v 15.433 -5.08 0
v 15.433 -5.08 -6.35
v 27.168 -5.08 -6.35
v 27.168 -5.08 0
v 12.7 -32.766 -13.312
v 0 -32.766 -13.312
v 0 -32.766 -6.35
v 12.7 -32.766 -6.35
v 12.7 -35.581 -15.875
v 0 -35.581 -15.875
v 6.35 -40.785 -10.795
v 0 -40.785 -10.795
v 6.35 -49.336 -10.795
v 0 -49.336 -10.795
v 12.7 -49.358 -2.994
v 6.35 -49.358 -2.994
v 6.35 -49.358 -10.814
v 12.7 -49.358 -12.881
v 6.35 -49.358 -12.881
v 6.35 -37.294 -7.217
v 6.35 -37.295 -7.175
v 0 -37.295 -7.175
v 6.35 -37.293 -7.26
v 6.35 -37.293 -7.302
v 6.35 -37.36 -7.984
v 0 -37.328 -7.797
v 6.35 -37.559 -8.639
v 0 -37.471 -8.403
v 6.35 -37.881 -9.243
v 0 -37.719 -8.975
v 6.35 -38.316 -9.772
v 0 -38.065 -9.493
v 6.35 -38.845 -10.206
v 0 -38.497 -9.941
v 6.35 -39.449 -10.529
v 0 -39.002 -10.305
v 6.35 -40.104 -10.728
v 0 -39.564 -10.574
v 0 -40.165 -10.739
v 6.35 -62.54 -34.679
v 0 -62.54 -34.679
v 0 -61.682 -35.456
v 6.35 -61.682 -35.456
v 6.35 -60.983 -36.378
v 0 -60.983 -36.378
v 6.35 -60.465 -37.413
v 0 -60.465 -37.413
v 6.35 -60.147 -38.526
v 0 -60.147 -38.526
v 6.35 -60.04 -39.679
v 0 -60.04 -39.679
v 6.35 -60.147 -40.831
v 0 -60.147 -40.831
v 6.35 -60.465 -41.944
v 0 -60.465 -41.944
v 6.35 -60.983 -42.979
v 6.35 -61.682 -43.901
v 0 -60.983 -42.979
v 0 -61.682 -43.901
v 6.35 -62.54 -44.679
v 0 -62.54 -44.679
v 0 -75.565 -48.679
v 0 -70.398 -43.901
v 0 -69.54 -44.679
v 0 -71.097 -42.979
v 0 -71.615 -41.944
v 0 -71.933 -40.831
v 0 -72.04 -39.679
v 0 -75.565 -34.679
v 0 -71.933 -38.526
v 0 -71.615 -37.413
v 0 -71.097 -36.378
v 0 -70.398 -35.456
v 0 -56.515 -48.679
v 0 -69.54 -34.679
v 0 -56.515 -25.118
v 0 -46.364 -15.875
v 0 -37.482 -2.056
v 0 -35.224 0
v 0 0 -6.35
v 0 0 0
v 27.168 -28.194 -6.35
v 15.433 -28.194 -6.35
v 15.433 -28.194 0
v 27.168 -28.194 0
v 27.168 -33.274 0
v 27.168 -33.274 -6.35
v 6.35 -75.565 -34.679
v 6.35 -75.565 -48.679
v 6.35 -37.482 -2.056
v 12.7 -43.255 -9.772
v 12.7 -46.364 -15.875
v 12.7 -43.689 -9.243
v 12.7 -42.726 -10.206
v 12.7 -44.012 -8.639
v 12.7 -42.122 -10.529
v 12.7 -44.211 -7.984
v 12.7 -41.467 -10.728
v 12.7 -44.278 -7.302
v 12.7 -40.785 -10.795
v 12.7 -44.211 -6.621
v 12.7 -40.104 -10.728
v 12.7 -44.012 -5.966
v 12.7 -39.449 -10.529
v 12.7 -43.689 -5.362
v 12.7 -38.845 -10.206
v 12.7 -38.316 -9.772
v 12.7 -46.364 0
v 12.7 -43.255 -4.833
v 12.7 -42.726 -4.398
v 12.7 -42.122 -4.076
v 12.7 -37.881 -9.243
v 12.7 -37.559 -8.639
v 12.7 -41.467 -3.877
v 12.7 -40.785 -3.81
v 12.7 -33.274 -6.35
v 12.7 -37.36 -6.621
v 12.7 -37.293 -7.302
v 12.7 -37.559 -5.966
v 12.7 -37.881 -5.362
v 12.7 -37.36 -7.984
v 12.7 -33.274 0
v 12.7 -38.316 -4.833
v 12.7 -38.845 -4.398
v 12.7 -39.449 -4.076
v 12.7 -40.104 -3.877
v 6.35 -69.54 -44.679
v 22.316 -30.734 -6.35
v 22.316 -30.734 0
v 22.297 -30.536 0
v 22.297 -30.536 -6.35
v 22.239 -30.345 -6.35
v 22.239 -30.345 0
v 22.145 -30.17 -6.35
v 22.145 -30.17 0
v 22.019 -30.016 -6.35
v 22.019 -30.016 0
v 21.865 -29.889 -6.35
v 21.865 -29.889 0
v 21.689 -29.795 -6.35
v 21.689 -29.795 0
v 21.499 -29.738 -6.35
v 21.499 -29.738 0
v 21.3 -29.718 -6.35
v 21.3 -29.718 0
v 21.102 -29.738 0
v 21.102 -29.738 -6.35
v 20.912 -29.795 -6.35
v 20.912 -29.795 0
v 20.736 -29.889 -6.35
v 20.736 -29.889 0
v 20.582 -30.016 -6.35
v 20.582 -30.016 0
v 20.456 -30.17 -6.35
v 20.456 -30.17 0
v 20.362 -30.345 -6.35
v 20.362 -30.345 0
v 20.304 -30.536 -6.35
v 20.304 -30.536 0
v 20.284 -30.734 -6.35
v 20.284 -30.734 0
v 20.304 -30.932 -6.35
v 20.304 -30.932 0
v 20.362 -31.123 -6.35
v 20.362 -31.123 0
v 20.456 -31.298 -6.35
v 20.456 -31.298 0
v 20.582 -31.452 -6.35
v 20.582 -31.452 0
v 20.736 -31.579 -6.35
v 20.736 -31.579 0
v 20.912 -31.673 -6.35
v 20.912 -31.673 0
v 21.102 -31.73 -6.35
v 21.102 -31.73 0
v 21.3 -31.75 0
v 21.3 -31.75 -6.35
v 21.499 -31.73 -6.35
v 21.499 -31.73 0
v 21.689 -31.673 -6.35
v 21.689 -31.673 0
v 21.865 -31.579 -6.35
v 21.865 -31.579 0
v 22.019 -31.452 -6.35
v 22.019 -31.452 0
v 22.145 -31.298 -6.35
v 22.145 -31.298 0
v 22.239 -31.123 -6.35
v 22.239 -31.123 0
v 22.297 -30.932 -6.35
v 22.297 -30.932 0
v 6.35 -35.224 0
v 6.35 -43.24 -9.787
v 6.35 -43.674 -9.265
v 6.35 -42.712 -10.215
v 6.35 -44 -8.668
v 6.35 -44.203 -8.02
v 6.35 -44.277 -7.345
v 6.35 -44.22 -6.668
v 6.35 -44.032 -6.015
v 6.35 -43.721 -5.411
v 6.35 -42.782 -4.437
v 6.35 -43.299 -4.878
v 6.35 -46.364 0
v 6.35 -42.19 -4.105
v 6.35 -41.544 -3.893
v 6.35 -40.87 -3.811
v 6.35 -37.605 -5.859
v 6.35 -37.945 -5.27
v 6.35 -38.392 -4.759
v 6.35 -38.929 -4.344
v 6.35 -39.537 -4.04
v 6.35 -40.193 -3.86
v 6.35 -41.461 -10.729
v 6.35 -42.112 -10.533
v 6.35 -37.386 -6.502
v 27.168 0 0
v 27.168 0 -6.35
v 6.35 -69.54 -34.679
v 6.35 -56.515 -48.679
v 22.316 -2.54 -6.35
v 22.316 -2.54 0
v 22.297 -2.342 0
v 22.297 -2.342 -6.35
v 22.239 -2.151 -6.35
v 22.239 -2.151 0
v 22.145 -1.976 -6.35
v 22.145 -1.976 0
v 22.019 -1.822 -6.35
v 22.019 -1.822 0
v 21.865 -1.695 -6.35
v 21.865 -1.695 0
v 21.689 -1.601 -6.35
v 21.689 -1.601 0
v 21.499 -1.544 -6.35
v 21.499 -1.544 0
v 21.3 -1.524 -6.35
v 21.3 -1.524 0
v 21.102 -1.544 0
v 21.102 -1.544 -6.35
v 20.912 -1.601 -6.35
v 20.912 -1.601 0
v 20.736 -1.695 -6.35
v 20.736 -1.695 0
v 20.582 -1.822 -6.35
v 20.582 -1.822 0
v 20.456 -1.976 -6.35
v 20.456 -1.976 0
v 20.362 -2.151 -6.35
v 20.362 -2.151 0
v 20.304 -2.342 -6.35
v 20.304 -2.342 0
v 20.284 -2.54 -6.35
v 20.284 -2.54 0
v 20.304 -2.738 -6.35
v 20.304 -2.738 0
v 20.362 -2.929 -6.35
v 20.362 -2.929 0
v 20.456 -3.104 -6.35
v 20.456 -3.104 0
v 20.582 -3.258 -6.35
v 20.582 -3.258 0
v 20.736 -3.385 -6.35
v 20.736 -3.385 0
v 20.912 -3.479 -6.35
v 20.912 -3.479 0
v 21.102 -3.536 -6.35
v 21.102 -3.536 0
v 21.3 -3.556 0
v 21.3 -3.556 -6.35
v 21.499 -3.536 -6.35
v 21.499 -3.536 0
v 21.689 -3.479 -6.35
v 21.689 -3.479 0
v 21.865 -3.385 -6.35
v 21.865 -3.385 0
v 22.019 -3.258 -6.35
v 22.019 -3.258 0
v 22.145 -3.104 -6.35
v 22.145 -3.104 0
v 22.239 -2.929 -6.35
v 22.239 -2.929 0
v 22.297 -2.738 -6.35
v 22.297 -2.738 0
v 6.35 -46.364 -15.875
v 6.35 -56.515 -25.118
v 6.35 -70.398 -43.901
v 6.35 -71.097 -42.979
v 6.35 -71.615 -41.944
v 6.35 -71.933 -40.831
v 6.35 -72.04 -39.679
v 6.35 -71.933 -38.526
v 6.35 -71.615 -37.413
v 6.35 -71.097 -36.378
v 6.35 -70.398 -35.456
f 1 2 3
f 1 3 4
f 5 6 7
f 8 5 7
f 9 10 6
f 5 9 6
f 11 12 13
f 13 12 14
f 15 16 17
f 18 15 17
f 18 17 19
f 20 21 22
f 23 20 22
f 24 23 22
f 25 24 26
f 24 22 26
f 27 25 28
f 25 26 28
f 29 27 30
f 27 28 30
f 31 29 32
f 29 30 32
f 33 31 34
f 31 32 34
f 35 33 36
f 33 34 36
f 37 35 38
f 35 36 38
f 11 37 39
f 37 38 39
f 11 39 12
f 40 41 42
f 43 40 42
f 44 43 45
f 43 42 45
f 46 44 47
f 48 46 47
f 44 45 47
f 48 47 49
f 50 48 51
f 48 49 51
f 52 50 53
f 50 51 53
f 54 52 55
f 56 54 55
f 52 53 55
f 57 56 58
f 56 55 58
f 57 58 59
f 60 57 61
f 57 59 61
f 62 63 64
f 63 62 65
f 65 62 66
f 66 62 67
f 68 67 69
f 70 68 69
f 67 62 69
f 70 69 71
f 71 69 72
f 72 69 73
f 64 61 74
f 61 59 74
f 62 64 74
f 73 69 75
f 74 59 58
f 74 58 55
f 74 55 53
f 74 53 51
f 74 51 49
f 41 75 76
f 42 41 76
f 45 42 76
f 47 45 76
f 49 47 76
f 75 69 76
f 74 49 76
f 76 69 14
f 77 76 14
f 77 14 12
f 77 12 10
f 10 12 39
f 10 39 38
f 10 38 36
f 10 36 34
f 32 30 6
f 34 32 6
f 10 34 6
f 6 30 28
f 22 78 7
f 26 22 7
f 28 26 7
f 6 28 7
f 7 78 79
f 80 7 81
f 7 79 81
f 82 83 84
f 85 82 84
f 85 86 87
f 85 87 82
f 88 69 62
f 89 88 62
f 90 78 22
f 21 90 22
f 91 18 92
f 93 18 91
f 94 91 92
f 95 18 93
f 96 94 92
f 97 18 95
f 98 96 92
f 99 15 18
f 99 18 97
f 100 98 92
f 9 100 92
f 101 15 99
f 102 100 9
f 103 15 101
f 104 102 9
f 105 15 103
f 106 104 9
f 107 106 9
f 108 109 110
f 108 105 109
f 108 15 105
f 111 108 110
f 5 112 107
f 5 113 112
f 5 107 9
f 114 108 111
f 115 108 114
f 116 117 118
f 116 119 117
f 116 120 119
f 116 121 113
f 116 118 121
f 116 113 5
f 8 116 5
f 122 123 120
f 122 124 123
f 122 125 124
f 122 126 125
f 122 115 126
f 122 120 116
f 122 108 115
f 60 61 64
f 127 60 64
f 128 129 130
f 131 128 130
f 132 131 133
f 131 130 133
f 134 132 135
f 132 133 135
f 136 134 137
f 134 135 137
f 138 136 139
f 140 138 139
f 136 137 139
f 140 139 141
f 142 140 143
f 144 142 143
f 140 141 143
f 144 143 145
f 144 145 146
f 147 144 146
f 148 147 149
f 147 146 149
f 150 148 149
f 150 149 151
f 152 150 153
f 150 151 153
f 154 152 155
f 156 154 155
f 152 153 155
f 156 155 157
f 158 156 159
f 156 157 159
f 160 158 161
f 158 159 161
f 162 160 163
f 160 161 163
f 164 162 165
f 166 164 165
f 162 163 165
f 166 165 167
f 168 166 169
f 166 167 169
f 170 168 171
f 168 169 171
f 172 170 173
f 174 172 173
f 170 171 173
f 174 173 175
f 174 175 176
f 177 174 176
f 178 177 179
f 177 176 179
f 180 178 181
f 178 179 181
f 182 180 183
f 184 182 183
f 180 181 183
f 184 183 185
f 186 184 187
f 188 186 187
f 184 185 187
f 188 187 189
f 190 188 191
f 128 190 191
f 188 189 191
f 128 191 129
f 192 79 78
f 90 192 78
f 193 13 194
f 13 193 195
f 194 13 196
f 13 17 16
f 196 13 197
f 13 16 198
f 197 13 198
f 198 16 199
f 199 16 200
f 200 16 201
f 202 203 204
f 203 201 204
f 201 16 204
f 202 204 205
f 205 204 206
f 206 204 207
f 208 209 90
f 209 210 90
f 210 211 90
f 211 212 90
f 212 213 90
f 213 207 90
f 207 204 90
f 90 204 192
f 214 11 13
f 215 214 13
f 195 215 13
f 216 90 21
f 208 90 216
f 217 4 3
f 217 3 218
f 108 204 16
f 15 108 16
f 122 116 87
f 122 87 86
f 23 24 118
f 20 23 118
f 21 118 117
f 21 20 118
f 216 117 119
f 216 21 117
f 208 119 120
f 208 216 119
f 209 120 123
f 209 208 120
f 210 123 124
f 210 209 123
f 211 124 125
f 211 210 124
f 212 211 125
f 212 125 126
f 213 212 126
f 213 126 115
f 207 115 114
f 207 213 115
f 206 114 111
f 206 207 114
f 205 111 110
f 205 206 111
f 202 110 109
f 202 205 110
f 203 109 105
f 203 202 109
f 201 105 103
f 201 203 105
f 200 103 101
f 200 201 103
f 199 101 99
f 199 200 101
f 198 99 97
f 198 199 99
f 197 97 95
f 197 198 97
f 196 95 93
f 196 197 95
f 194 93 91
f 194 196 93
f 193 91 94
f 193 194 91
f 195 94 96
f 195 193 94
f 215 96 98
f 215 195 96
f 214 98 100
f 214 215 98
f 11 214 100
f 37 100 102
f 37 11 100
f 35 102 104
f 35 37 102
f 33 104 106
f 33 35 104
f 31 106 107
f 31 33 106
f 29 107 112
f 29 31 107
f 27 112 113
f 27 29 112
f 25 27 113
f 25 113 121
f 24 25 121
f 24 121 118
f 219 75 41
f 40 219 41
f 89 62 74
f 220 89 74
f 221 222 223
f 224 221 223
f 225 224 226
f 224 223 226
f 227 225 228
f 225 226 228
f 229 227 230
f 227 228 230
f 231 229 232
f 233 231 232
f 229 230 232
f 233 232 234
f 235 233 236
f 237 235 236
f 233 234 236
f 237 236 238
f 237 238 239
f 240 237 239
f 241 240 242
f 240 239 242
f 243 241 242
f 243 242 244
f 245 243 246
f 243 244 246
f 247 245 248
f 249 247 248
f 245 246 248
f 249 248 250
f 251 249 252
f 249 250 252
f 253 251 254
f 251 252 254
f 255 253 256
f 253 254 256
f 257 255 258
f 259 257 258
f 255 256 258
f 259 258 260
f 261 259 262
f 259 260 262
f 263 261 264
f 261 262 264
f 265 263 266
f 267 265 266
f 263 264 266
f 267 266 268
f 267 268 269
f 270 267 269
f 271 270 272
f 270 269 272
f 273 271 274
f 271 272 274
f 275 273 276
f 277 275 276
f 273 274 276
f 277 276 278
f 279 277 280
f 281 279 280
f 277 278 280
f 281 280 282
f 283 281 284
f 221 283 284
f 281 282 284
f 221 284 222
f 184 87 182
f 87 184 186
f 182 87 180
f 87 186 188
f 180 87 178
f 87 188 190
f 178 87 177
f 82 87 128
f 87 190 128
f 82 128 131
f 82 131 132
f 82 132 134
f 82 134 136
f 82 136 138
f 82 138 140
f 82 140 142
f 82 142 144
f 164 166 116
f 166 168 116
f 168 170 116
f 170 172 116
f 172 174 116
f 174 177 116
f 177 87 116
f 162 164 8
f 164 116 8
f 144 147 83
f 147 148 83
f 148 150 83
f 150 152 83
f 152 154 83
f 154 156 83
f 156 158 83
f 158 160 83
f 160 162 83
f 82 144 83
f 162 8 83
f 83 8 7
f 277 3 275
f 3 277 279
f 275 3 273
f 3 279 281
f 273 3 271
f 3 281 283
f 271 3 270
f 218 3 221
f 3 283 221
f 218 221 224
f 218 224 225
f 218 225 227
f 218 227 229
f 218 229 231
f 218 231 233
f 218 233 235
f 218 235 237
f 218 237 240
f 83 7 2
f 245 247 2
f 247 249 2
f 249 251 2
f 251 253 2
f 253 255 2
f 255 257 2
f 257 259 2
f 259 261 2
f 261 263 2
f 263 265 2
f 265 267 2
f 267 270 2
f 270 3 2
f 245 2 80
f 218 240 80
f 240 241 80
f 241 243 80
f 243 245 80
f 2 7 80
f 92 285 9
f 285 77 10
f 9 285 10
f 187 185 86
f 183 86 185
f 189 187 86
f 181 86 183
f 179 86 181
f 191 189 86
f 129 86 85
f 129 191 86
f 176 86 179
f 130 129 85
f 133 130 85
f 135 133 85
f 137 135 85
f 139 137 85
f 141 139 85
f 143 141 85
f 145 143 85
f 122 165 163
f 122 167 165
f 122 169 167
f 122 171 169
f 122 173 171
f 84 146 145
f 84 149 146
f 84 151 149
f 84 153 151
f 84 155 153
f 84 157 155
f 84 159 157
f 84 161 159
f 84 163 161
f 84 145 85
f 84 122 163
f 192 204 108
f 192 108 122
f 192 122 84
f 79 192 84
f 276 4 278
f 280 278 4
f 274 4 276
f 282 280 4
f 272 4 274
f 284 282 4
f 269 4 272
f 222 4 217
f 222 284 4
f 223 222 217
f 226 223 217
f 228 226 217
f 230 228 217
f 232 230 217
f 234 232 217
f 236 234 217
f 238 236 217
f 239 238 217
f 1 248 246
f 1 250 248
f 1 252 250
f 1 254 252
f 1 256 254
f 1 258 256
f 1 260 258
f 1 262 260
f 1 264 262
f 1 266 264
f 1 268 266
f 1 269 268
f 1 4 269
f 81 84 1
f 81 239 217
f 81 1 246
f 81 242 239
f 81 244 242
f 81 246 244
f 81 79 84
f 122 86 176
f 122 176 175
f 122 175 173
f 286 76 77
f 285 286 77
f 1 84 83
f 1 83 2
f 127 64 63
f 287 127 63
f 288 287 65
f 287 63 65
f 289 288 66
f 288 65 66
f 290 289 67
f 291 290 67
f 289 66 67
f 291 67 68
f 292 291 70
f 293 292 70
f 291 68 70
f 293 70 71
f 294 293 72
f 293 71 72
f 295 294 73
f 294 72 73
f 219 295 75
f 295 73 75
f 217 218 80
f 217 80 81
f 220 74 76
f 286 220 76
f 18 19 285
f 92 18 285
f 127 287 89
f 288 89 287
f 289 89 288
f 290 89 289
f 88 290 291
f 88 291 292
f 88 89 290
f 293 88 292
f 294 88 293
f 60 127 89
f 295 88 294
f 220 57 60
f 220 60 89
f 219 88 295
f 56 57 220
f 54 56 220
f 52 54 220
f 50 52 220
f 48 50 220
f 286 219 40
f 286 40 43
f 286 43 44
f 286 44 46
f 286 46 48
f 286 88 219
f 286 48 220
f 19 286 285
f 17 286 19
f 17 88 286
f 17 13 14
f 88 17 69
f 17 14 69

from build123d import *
from build123d import SkipClean  # not in build123d's __all__

# Parameters (mm, degrees)
F1_DEPTH = 6.35
F2_R     = 3.4925
F3_DEPTH = 6.35
F4_W     = 33.274
F4_H     = 6.35
F5_DEPTH = 9.08304
F6_W     = 5.08
F6_H     = 6.35
F7_DEPTH = 11.7348
F8_R     = 1.016
F9_DEPTH = 6.35


# Not quite as in the source:
# - after a boolean that leaves OpenCascade's solid faulty, fix() repairs it


with BuildPart() as f1:
    # F0 (on Right) → F1 (new body)
    with BuildSketch(Plane.YZ):
        with BuildLine():
            Line((0, -6.35), (0, 0))
            Line((0, 0), (-32.766, 0))
            Line((-32.766, 0), (-35.2239654818, 0))
            Line((-35.2239654818, 0), (-37.4816982729, -2.0558894312))
            Line((-37.4816982729, -2.0558894312), (-37.2950388694, -7.1750314139))
            ThreePointArc((-37.2950388694, -7.1750314139), (-38.2710574955, -9.7264527612), (-40.7852194514, -10.7947939567))
            Line((-40.7852194514, -10.7947939567), (-49.3363048096, -10.7947939567))
            Line((-49.3363048096, -10.7947939567), (-75.565, -34.67862))
            Line((-75.565, -34.67862), (-75.565, -48.67862))
            Line((-75.565, -48.67862), (-56.515, -48.67862))
            Line((-56.515, -48.67862), (-56.515, -25.1183178527))
            Line((-56.515, -25.1183178527), (-46.3639643027, -15.8747939567))
            Line((-46.3639643027, -15.8747939567), (-35.5806867418, -15.8747939567))
            Line((-35.5806867418, -15.8747939567), (-32.766, -13.3117427633))
            Line((-32.766, -13.3117427633), (-32.766, -6.35))
            Line((-32.766, -6.35), (0, -6.35))
        make_face()
        with BuildLine():
            ThreePointArc((-69.54, -44.67862), (-72.04, -39.67862), (-69.54, -34.67862))
            Line((-69.54, -34.67862), (-62.54, -34.67862))
            ThreePointArc((-62.54, -34.67862), (-60.04, -39.67862), (-62.54, -44.67862))
            Line((-62.54, -44.67862), (-69.54, -44.67862))
        make_face(mode=Mode.SUBTRACT)
    extrude(amount=F1_DEPTH)

    # F2 (on face) → F3 (join)
    with BuildSketch(Plane.YZ.offset(6.35)):
        Polygon((-32.766, -13.3117427633), (-32.766, 0), (-46.3639643027, 0), (-49.3577194514, -2.9937551487), (-49.3577194514, -12.8810388079), (-46.3639643027, -15.8747939567), (-35.5806867418, -15.8747939567), align=None)
        with Locations((-40.7852194514, -7.3022939567)):
            Circle(F2_R, mode=Mode.SUBTRACT)
    with SkipClean():  # cleaning this boolean's faces spoils the solid; the shape is the same uncleaned
        extrude(amount=F3_DEPTH)

    # F4 (on face) → F5 (join)
    with BuildSketch(Plane.YZ.offset(6.35)):
        with Locations((-16.637, -3.175)):
            Rectangle(F4_W, F4_H)
    extrude(amount=F5_DEPTH)

    add(f1.part.fix(), mode=Mode.REPLACE)

    # F6 (on face) → F7 (join)
    with BuildSketch(Plane.YZ.offset(15.43304)):
        with Locations((-2.54, -3.175)):
            Rectangle(F6_W, F6_H)
        with Locations((-30.734, -3.175)):
            Rectangle(F6_W, F6_H)
    extrude(amount=F7_DEPTH)

    add(f1.part.fix(), mode=Mode.REPLACE)

    # F8 (on face) → F9 (cut, through all)
    with BuildSketch(Plane.XY):
        with Locations((21.30044, -30.734)):
            Circle(F8_R)
        with Locations((21.30044, -2.54)):
            Circle(F8_R)
    extrude(amount=-F9_DEPTH, mode=Mode.SUBTRACT)


solid = f1.part
